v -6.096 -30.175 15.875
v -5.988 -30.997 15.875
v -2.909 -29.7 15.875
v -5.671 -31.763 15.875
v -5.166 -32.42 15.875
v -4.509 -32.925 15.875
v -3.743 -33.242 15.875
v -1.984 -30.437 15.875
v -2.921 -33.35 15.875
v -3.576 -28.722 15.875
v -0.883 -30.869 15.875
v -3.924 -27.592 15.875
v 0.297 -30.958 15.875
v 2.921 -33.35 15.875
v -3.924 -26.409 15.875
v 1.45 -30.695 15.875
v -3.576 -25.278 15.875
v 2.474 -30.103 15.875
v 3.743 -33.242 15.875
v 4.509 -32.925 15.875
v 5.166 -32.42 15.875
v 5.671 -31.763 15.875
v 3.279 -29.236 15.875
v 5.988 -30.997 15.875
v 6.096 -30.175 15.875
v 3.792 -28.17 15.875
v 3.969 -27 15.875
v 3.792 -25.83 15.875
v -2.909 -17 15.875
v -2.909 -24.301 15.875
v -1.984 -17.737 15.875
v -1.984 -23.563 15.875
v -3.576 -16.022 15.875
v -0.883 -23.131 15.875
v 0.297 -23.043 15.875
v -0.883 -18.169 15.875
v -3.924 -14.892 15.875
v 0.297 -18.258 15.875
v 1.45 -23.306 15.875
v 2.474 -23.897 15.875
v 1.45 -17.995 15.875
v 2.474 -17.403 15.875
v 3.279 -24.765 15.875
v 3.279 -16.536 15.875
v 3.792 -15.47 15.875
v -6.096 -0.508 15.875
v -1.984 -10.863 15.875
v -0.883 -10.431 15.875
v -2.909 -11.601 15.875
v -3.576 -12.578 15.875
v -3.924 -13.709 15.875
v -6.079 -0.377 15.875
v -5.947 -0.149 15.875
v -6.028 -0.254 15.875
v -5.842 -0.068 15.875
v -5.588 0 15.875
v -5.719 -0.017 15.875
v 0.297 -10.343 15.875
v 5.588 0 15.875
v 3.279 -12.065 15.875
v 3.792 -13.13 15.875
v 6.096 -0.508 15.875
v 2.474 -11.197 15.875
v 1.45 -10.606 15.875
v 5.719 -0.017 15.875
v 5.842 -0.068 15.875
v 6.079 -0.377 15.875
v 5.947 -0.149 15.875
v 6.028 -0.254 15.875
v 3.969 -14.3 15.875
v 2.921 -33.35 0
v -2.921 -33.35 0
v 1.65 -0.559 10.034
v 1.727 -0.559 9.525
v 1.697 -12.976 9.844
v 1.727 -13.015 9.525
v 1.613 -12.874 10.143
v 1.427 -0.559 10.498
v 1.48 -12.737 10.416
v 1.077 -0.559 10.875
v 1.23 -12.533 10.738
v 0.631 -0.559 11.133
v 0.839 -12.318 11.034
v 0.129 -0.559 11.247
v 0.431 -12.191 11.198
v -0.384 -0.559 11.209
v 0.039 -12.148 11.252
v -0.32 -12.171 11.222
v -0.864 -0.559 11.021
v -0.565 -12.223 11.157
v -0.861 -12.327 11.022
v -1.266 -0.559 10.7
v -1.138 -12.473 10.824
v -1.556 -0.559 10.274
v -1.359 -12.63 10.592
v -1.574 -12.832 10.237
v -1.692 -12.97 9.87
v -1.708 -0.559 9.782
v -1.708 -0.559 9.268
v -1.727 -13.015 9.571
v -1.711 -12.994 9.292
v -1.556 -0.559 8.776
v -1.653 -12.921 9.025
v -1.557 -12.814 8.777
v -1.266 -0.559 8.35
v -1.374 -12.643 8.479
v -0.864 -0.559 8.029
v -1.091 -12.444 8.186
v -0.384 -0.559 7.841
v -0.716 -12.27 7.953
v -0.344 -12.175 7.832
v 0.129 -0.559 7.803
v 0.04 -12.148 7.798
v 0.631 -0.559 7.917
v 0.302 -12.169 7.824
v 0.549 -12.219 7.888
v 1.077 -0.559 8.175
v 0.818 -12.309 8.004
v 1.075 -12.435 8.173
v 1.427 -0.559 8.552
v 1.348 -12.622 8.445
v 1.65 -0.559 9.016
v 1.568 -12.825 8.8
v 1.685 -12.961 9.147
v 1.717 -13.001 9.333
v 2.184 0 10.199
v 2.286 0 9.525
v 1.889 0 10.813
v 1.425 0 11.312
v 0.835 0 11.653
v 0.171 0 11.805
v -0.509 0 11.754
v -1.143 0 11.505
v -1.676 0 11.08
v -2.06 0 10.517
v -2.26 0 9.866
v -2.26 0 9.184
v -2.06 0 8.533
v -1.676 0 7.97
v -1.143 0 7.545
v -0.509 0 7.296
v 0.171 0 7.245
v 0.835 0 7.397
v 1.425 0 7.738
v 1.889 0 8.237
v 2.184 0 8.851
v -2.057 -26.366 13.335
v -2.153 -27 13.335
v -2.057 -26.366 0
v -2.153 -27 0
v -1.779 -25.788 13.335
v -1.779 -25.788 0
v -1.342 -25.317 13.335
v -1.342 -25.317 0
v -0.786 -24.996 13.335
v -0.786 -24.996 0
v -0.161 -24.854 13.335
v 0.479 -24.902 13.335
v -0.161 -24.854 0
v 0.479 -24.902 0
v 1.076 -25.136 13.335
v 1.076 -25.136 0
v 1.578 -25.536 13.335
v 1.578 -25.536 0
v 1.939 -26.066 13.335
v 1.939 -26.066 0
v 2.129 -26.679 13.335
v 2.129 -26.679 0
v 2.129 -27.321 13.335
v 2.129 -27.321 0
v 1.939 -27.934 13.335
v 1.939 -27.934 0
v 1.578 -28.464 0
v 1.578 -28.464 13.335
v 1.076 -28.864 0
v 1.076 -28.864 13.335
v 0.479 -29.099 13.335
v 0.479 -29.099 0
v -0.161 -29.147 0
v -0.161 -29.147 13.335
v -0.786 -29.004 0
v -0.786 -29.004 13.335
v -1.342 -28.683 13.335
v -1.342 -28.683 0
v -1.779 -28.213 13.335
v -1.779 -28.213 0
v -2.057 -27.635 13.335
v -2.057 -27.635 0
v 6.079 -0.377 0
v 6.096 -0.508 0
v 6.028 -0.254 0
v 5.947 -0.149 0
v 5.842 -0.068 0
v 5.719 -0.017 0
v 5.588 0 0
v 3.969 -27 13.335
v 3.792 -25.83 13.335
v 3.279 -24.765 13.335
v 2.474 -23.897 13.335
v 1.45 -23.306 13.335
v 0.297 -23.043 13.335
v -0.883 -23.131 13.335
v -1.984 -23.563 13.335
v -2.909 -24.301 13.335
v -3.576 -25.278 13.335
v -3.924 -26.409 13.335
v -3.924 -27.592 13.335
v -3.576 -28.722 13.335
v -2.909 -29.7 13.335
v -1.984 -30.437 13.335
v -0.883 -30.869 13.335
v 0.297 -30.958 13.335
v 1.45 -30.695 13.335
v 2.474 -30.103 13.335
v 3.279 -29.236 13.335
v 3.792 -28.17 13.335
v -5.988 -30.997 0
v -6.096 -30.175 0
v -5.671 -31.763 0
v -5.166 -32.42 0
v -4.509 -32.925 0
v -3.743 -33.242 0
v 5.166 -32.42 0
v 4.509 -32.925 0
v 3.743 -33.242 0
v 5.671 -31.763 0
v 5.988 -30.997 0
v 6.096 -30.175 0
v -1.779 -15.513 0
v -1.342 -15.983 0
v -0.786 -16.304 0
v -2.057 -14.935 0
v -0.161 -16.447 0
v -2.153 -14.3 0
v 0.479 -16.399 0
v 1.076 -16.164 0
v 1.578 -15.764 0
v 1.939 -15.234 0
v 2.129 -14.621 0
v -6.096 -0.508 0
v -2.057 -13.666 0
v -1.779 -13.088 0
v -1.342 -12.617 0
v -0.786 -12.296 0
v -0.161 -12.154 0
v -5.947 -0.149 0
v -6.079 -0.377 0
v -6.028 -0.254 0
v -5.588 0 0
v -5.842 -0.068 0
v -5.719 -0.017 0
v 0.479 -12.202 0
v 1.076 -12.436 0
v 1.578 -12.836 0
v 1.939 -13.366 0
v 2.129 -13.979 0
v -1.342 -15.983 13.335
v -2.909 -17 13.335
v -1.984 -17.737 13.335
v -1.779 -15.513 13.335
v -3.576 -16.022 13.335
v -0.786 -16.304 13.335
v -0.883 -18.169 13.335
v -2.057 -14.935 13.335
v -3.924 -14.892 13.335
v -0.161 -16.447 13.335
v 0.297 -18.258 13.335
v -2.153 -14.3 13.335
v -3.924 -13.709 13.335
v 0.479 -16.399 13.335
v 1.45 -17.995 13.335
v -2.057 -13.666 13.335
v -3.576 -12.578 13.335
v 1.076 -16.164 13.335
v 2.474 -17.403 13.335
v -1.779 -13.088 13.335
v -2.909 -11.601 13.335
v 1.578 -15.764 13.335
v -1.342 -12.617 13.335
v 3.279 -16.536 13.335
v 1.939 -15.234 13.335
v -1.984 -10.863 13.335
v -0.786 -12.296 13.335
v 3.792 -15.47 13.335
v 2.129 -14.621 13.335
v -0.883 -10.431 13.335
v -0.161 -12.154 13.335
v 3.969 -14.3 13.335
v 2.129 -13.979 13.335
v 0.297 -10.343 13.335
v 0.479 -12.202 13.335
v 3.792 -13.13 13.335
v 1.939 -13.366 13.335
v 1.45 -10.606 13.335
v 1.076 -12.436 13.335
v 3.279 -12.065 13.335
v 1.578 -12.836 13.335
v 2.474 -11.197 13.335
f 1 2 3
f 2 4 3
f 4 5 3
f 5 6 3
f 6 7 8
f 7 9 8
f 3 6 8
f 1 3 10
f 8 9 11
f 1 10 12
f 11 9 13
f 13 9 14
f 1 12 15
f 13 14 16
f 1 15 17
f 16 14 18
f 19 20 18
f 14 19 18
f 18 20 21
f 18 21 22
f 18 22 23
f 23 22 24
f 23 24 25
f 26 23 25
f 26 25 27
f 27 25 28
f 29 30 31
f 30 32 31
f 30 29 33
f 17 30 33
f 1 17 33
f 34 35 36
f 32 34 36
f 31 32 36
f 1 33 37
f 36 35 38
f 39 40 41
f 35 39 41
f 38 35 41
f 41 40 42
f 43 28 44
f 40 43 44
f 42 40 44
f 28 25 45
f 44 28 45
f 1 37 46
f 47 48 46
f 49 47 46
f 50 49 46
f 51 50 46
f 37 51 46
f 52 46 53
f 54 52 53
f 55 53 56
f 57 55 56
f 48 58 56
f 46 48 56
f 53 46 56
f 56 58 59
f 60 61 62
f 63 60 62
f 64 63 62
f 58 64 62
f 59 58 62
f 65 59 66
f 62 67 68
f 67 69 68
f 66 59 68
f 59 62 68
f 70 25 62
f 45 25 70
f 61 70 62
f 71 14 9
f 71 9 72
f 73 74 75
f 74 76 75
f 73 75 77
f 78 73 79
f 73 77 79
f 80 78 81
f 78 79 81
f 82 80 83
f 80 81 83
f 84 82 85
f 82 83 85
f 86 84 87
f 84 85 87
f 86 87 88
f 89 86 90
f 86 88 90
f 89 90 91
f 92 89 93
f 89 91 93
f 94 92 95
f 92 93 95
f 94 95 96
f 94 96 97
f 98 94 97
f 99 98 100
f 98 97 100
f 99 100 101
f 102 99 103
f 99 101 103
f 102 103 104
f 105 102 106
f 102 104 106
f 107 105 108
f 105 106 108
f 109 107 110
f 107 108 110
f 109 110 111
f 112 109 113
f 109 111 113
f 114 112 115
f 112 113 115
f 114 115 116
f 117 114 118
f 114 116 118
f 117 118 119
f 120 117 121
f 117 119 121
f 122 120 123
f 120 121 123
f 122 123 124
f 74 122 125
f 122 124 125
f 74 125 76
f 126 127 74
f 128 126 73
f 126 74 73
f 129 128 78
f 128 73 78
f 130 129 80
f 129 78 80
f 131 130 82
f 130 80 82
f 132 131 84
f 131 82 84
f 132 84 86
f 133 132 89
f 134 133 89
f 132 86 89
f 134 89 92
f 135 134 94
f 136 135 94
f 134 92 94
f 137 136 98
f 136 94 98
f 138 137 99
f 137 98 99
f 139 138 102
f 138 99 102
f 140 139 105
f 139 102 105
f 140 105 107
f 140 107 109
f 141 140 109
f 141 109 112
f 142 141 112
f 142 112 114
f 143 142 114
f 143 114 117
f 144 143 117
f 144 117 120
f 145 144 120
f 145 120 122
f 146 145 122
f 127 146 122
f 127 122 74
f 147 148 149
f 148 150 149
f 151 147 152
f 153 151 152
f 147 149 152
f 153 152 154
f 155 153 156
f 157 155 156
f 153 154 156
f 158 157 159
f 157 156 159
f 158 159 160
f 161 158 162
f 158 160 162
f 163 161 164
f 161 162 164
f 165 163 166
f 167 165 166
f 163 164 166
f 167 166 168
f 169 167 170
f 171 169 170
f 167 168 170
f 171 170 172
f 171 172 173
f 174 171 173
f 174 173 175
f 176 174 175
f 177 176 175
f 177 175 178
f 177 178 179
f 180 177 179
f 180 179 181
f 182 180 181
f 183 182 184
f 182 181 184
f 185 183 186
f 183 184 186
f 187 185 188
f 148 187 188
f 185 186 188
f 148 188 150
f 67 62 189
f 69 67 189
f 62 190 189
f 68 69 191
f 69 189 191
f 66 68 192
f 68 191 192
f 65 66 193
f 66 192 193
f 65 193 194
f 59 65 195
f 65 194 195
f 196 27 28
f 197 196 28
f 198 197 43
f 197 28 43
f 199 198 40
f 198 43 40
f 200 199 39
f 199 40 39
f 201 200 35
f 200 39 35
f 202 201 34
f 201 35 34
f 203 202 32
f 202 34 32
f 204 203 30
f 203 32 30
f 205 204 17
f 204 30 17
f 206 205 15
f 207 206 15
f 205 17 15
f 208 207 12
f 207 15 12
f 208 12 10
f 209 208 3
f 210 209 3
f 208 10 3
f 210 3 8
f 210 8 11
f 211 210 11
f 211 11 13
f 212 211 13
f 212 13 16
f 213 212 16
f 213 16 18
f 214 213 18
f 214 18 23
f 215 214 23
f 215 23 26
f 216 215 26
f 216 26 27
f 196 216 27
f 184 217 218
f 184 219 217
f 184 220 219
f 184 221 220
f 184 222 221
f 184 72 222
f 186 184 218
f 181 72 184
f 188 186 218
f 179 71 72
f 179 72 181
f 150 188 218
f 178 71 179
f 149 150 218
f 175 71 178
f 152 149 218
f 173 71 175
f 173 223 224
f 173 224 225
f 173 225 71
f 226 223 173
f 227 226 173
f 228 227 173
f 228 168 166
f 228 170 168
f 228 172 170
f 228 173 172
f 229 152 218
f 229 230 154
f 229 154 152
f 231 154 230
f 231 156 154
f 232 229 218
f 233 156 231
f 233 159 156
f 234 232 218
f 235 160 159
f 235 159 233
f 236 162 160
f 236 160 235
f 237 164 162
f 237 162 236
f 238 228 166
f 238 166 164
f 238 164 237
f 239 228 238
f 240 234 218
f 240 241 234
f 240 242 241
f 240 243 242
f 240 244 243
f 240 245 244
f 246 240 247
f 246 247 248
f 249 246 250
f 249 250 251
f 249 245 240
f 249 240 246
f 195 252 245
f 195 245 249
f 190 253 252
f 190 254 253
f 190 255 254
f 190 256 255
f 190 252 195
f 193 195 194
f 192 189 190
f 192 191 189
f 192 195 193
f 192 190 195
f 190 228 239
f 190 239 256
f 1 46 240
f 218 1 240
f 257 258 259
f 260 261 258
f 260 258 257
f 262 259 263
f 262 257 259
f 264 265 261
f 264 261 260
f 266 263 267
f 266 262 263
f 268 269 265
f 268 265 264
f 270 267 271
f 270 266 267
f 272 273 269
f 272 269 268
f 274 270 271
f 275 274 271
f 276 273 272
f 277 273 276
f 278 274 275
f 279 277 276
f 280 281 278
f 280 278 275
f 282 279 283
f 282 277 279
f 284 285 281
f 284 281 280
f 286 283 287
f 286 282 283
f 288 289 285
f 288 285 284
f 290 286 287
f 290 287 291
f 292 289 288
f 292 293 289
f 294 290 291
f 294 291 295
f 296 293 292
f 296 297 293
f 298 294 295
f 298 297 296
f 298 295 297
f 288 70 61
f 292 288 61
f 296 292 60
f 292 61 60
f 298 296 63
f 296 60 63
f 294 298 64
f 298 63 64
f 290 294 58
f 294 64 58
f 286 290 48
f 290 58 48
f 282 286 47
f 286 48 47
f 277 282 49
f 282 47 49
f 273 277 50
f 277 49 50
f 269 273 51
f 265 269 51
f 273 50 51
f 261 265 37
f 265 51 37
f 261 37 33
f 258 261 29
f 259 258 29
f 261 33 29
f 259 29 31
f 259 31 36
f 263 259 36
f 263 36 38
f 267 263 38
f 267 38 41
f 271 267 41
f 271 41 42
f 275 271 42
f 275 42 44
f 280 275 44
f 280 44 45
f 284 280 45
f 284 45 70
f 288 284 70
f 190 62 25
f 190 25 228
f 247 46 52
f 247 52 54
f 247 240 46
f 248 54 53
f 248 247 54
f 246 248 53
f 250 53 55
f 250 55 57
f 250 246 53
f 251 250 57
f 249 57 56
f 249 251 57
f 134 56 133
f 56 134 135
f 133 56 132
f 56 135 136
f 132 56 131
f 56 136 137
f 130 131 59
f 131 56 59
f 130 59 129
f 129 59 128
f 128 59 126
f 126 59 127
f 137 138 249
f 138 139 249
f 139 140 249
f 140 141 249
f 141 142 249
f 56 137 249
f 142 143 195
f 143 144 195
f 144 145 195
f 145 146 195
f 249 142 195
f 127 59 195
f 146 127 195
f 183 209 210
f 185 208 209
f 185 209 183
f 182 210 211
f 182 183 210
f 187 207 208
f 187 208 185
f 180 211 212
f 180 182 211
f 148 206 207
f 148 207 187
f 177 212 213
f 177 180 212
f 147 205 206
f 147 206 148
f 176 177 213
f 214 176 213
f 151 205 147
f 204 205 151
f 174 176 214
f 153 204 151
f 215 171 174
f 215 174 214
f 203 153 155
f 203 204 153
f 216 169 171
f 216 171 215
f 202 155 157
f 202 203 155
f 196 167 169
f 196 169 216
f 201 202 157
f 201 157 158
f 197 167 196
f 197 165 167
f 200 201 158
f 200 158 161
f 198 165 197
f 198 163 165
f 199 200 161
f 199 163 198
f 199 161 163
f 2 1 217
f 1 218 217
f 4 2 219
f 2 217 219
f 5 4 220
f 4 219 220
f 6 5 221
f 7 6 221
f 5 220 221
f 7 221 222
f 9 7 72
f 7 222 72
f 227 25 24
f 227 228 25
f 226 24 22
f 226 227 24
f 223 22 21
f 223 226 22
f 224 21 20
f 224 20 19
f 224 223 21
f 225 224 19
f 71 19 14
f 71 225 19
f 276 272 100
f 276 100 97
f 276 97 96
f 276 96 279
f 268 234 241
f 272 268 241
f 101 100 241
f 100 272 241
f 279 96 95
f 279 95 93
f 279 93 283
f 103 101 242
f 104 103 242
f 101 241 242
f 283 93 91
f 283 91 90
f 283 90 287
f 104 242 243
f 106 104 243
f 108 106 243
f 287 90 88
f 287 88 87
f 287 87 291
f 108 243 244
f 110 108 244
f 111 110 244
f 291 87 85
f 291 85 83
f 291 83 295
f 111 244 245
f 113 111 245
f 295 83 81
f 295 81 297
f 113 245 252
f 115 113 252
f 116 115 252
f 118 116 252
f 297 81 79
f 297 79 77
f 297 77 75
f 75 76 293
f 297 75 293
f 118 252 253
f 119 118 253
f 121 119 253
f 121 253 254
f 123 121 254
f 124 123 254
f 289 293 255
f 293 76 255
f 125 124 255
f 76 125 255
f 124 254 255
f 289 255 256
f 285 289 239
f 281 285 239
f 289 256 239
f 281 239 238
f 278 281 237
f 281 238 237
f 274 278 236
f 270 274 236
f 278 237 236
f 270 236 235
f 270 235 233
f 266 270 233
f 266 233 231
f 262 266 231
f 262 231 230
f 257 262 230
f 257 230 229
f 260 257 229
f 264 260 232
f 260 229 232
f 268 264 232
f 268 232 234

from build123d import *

# Parameters (mm, degrees)
SKETCH1_W                                      = 15.875
SKETCH1_H                                      = 33.3502
BOSS_EXTRUDE1_DEPTH                            = 6.096
CBORE_FOR_8_SOCKET_HEAD_CAP_SCREW1_D           = 4.3053
CBORE_FOR_8_SOCKET_HEAD_CAP_SCREW1_CBORE_D     = 7.9375
CBORE_FOR_8_SOCKET_HEAD_CAP_SCREW1_CBORE_DEPTH = 2.54
F_8_32_TAPPED_HOLE1_D                          = 3.4544
F_8_32_TAPPED_HOLE1_DEPTH                      = 15.24
F_8_32_TAPPED_HOLE1_CSINK_D                    = 4.572
F_8_32_TAPPED_HOLE1_CSINK_ANGLE                = 90
F_8_32_TAPPED_HOLE1_TIP                        = 1.037806461
FILLET1_R                                      = 3.175
FILLET2_R                                      = 0.508


with BuildPart() as part:
    # Sketch1 → Boss-Extrude1 (new, symmetric)
    with BuildSketch(Plane(origin=(0, 0, 0), x_dir=(0, 0, -1), z_dir=(1, 0, 0))):
        with Locations((-7.9375, -16.6751)):
            Rectangle(SKETCH1_W, SKETCH1_H)
    extrude(amount=BOSS_EXTRUDE1_DEPTH, both=True)

    # CBORE for #8 Socket Head Cap Screw1 (through all)
    with Locations(Plane.XY.offset(15.875)):
        with Locations((0, -14.3002), (0, -27.0002)):
            CounterBoreHole(CBORE_FOR_8_SOCKET_HEAD_CAP_SCREW1_D / 2, CBORE_FOR_8_SOCKET_HEAD_CAP_SCREW1_CBORE_D / 2, CBORE_FOR_8_SOCKET_HEAD_CAP_SCREW1_CBORE_DEPTH)

    # #8-32 Tapped Hole1
    with Locations(Plane(origin=(0, 0, 0), x_dir=(-1, 0, 0), z_dir=(0, 1, 0))):
        with Locations((0, 9.525)):
            CounterSinkHole(F_8_32_TAPPED_HOLE1_D / 2, F_8_32_TAPPED_HOLE1_CSINK_D / 2, depth=F_8_32_TAPPED_HOLE1_DEPTH, counter_sink_angle=F_8_32_TAPPED_HOLE1_CSINK_ANGLE)
            with Locations((0, 0, -(F_8_32_TAPPED_HOLE1_DEPTH + F_8_32_TAPPED_HOLE1_TIP / 2))):  # 118° drill point
                Cone(0, F_8_32_TAPPED_HOLE1_D / 2, F_8_32_TAPPED_HOLE1_TIP, mode=Mode.SUBTRACT)

    # Fillet1
    fillet1_edges = [part.edges().sort_by_distance(p)[0] for p in [
        (6.096, -33.3502, 7.9375),
        (-6.096, -33.3502, 7.9375),
    ]]
    fillet(fillet1_edges, radius=FILLET1_R)

    # Fillet2
    fillet2_edges = [part.edges().sort_by_distance(p)[0] for p in [
        (-6.096, 0, 7.9375),
        (6.096, 0, 7.9375),
    ]]
    fillet(fillet2_edges, radius=FILLET2_R)


solid = part.part
